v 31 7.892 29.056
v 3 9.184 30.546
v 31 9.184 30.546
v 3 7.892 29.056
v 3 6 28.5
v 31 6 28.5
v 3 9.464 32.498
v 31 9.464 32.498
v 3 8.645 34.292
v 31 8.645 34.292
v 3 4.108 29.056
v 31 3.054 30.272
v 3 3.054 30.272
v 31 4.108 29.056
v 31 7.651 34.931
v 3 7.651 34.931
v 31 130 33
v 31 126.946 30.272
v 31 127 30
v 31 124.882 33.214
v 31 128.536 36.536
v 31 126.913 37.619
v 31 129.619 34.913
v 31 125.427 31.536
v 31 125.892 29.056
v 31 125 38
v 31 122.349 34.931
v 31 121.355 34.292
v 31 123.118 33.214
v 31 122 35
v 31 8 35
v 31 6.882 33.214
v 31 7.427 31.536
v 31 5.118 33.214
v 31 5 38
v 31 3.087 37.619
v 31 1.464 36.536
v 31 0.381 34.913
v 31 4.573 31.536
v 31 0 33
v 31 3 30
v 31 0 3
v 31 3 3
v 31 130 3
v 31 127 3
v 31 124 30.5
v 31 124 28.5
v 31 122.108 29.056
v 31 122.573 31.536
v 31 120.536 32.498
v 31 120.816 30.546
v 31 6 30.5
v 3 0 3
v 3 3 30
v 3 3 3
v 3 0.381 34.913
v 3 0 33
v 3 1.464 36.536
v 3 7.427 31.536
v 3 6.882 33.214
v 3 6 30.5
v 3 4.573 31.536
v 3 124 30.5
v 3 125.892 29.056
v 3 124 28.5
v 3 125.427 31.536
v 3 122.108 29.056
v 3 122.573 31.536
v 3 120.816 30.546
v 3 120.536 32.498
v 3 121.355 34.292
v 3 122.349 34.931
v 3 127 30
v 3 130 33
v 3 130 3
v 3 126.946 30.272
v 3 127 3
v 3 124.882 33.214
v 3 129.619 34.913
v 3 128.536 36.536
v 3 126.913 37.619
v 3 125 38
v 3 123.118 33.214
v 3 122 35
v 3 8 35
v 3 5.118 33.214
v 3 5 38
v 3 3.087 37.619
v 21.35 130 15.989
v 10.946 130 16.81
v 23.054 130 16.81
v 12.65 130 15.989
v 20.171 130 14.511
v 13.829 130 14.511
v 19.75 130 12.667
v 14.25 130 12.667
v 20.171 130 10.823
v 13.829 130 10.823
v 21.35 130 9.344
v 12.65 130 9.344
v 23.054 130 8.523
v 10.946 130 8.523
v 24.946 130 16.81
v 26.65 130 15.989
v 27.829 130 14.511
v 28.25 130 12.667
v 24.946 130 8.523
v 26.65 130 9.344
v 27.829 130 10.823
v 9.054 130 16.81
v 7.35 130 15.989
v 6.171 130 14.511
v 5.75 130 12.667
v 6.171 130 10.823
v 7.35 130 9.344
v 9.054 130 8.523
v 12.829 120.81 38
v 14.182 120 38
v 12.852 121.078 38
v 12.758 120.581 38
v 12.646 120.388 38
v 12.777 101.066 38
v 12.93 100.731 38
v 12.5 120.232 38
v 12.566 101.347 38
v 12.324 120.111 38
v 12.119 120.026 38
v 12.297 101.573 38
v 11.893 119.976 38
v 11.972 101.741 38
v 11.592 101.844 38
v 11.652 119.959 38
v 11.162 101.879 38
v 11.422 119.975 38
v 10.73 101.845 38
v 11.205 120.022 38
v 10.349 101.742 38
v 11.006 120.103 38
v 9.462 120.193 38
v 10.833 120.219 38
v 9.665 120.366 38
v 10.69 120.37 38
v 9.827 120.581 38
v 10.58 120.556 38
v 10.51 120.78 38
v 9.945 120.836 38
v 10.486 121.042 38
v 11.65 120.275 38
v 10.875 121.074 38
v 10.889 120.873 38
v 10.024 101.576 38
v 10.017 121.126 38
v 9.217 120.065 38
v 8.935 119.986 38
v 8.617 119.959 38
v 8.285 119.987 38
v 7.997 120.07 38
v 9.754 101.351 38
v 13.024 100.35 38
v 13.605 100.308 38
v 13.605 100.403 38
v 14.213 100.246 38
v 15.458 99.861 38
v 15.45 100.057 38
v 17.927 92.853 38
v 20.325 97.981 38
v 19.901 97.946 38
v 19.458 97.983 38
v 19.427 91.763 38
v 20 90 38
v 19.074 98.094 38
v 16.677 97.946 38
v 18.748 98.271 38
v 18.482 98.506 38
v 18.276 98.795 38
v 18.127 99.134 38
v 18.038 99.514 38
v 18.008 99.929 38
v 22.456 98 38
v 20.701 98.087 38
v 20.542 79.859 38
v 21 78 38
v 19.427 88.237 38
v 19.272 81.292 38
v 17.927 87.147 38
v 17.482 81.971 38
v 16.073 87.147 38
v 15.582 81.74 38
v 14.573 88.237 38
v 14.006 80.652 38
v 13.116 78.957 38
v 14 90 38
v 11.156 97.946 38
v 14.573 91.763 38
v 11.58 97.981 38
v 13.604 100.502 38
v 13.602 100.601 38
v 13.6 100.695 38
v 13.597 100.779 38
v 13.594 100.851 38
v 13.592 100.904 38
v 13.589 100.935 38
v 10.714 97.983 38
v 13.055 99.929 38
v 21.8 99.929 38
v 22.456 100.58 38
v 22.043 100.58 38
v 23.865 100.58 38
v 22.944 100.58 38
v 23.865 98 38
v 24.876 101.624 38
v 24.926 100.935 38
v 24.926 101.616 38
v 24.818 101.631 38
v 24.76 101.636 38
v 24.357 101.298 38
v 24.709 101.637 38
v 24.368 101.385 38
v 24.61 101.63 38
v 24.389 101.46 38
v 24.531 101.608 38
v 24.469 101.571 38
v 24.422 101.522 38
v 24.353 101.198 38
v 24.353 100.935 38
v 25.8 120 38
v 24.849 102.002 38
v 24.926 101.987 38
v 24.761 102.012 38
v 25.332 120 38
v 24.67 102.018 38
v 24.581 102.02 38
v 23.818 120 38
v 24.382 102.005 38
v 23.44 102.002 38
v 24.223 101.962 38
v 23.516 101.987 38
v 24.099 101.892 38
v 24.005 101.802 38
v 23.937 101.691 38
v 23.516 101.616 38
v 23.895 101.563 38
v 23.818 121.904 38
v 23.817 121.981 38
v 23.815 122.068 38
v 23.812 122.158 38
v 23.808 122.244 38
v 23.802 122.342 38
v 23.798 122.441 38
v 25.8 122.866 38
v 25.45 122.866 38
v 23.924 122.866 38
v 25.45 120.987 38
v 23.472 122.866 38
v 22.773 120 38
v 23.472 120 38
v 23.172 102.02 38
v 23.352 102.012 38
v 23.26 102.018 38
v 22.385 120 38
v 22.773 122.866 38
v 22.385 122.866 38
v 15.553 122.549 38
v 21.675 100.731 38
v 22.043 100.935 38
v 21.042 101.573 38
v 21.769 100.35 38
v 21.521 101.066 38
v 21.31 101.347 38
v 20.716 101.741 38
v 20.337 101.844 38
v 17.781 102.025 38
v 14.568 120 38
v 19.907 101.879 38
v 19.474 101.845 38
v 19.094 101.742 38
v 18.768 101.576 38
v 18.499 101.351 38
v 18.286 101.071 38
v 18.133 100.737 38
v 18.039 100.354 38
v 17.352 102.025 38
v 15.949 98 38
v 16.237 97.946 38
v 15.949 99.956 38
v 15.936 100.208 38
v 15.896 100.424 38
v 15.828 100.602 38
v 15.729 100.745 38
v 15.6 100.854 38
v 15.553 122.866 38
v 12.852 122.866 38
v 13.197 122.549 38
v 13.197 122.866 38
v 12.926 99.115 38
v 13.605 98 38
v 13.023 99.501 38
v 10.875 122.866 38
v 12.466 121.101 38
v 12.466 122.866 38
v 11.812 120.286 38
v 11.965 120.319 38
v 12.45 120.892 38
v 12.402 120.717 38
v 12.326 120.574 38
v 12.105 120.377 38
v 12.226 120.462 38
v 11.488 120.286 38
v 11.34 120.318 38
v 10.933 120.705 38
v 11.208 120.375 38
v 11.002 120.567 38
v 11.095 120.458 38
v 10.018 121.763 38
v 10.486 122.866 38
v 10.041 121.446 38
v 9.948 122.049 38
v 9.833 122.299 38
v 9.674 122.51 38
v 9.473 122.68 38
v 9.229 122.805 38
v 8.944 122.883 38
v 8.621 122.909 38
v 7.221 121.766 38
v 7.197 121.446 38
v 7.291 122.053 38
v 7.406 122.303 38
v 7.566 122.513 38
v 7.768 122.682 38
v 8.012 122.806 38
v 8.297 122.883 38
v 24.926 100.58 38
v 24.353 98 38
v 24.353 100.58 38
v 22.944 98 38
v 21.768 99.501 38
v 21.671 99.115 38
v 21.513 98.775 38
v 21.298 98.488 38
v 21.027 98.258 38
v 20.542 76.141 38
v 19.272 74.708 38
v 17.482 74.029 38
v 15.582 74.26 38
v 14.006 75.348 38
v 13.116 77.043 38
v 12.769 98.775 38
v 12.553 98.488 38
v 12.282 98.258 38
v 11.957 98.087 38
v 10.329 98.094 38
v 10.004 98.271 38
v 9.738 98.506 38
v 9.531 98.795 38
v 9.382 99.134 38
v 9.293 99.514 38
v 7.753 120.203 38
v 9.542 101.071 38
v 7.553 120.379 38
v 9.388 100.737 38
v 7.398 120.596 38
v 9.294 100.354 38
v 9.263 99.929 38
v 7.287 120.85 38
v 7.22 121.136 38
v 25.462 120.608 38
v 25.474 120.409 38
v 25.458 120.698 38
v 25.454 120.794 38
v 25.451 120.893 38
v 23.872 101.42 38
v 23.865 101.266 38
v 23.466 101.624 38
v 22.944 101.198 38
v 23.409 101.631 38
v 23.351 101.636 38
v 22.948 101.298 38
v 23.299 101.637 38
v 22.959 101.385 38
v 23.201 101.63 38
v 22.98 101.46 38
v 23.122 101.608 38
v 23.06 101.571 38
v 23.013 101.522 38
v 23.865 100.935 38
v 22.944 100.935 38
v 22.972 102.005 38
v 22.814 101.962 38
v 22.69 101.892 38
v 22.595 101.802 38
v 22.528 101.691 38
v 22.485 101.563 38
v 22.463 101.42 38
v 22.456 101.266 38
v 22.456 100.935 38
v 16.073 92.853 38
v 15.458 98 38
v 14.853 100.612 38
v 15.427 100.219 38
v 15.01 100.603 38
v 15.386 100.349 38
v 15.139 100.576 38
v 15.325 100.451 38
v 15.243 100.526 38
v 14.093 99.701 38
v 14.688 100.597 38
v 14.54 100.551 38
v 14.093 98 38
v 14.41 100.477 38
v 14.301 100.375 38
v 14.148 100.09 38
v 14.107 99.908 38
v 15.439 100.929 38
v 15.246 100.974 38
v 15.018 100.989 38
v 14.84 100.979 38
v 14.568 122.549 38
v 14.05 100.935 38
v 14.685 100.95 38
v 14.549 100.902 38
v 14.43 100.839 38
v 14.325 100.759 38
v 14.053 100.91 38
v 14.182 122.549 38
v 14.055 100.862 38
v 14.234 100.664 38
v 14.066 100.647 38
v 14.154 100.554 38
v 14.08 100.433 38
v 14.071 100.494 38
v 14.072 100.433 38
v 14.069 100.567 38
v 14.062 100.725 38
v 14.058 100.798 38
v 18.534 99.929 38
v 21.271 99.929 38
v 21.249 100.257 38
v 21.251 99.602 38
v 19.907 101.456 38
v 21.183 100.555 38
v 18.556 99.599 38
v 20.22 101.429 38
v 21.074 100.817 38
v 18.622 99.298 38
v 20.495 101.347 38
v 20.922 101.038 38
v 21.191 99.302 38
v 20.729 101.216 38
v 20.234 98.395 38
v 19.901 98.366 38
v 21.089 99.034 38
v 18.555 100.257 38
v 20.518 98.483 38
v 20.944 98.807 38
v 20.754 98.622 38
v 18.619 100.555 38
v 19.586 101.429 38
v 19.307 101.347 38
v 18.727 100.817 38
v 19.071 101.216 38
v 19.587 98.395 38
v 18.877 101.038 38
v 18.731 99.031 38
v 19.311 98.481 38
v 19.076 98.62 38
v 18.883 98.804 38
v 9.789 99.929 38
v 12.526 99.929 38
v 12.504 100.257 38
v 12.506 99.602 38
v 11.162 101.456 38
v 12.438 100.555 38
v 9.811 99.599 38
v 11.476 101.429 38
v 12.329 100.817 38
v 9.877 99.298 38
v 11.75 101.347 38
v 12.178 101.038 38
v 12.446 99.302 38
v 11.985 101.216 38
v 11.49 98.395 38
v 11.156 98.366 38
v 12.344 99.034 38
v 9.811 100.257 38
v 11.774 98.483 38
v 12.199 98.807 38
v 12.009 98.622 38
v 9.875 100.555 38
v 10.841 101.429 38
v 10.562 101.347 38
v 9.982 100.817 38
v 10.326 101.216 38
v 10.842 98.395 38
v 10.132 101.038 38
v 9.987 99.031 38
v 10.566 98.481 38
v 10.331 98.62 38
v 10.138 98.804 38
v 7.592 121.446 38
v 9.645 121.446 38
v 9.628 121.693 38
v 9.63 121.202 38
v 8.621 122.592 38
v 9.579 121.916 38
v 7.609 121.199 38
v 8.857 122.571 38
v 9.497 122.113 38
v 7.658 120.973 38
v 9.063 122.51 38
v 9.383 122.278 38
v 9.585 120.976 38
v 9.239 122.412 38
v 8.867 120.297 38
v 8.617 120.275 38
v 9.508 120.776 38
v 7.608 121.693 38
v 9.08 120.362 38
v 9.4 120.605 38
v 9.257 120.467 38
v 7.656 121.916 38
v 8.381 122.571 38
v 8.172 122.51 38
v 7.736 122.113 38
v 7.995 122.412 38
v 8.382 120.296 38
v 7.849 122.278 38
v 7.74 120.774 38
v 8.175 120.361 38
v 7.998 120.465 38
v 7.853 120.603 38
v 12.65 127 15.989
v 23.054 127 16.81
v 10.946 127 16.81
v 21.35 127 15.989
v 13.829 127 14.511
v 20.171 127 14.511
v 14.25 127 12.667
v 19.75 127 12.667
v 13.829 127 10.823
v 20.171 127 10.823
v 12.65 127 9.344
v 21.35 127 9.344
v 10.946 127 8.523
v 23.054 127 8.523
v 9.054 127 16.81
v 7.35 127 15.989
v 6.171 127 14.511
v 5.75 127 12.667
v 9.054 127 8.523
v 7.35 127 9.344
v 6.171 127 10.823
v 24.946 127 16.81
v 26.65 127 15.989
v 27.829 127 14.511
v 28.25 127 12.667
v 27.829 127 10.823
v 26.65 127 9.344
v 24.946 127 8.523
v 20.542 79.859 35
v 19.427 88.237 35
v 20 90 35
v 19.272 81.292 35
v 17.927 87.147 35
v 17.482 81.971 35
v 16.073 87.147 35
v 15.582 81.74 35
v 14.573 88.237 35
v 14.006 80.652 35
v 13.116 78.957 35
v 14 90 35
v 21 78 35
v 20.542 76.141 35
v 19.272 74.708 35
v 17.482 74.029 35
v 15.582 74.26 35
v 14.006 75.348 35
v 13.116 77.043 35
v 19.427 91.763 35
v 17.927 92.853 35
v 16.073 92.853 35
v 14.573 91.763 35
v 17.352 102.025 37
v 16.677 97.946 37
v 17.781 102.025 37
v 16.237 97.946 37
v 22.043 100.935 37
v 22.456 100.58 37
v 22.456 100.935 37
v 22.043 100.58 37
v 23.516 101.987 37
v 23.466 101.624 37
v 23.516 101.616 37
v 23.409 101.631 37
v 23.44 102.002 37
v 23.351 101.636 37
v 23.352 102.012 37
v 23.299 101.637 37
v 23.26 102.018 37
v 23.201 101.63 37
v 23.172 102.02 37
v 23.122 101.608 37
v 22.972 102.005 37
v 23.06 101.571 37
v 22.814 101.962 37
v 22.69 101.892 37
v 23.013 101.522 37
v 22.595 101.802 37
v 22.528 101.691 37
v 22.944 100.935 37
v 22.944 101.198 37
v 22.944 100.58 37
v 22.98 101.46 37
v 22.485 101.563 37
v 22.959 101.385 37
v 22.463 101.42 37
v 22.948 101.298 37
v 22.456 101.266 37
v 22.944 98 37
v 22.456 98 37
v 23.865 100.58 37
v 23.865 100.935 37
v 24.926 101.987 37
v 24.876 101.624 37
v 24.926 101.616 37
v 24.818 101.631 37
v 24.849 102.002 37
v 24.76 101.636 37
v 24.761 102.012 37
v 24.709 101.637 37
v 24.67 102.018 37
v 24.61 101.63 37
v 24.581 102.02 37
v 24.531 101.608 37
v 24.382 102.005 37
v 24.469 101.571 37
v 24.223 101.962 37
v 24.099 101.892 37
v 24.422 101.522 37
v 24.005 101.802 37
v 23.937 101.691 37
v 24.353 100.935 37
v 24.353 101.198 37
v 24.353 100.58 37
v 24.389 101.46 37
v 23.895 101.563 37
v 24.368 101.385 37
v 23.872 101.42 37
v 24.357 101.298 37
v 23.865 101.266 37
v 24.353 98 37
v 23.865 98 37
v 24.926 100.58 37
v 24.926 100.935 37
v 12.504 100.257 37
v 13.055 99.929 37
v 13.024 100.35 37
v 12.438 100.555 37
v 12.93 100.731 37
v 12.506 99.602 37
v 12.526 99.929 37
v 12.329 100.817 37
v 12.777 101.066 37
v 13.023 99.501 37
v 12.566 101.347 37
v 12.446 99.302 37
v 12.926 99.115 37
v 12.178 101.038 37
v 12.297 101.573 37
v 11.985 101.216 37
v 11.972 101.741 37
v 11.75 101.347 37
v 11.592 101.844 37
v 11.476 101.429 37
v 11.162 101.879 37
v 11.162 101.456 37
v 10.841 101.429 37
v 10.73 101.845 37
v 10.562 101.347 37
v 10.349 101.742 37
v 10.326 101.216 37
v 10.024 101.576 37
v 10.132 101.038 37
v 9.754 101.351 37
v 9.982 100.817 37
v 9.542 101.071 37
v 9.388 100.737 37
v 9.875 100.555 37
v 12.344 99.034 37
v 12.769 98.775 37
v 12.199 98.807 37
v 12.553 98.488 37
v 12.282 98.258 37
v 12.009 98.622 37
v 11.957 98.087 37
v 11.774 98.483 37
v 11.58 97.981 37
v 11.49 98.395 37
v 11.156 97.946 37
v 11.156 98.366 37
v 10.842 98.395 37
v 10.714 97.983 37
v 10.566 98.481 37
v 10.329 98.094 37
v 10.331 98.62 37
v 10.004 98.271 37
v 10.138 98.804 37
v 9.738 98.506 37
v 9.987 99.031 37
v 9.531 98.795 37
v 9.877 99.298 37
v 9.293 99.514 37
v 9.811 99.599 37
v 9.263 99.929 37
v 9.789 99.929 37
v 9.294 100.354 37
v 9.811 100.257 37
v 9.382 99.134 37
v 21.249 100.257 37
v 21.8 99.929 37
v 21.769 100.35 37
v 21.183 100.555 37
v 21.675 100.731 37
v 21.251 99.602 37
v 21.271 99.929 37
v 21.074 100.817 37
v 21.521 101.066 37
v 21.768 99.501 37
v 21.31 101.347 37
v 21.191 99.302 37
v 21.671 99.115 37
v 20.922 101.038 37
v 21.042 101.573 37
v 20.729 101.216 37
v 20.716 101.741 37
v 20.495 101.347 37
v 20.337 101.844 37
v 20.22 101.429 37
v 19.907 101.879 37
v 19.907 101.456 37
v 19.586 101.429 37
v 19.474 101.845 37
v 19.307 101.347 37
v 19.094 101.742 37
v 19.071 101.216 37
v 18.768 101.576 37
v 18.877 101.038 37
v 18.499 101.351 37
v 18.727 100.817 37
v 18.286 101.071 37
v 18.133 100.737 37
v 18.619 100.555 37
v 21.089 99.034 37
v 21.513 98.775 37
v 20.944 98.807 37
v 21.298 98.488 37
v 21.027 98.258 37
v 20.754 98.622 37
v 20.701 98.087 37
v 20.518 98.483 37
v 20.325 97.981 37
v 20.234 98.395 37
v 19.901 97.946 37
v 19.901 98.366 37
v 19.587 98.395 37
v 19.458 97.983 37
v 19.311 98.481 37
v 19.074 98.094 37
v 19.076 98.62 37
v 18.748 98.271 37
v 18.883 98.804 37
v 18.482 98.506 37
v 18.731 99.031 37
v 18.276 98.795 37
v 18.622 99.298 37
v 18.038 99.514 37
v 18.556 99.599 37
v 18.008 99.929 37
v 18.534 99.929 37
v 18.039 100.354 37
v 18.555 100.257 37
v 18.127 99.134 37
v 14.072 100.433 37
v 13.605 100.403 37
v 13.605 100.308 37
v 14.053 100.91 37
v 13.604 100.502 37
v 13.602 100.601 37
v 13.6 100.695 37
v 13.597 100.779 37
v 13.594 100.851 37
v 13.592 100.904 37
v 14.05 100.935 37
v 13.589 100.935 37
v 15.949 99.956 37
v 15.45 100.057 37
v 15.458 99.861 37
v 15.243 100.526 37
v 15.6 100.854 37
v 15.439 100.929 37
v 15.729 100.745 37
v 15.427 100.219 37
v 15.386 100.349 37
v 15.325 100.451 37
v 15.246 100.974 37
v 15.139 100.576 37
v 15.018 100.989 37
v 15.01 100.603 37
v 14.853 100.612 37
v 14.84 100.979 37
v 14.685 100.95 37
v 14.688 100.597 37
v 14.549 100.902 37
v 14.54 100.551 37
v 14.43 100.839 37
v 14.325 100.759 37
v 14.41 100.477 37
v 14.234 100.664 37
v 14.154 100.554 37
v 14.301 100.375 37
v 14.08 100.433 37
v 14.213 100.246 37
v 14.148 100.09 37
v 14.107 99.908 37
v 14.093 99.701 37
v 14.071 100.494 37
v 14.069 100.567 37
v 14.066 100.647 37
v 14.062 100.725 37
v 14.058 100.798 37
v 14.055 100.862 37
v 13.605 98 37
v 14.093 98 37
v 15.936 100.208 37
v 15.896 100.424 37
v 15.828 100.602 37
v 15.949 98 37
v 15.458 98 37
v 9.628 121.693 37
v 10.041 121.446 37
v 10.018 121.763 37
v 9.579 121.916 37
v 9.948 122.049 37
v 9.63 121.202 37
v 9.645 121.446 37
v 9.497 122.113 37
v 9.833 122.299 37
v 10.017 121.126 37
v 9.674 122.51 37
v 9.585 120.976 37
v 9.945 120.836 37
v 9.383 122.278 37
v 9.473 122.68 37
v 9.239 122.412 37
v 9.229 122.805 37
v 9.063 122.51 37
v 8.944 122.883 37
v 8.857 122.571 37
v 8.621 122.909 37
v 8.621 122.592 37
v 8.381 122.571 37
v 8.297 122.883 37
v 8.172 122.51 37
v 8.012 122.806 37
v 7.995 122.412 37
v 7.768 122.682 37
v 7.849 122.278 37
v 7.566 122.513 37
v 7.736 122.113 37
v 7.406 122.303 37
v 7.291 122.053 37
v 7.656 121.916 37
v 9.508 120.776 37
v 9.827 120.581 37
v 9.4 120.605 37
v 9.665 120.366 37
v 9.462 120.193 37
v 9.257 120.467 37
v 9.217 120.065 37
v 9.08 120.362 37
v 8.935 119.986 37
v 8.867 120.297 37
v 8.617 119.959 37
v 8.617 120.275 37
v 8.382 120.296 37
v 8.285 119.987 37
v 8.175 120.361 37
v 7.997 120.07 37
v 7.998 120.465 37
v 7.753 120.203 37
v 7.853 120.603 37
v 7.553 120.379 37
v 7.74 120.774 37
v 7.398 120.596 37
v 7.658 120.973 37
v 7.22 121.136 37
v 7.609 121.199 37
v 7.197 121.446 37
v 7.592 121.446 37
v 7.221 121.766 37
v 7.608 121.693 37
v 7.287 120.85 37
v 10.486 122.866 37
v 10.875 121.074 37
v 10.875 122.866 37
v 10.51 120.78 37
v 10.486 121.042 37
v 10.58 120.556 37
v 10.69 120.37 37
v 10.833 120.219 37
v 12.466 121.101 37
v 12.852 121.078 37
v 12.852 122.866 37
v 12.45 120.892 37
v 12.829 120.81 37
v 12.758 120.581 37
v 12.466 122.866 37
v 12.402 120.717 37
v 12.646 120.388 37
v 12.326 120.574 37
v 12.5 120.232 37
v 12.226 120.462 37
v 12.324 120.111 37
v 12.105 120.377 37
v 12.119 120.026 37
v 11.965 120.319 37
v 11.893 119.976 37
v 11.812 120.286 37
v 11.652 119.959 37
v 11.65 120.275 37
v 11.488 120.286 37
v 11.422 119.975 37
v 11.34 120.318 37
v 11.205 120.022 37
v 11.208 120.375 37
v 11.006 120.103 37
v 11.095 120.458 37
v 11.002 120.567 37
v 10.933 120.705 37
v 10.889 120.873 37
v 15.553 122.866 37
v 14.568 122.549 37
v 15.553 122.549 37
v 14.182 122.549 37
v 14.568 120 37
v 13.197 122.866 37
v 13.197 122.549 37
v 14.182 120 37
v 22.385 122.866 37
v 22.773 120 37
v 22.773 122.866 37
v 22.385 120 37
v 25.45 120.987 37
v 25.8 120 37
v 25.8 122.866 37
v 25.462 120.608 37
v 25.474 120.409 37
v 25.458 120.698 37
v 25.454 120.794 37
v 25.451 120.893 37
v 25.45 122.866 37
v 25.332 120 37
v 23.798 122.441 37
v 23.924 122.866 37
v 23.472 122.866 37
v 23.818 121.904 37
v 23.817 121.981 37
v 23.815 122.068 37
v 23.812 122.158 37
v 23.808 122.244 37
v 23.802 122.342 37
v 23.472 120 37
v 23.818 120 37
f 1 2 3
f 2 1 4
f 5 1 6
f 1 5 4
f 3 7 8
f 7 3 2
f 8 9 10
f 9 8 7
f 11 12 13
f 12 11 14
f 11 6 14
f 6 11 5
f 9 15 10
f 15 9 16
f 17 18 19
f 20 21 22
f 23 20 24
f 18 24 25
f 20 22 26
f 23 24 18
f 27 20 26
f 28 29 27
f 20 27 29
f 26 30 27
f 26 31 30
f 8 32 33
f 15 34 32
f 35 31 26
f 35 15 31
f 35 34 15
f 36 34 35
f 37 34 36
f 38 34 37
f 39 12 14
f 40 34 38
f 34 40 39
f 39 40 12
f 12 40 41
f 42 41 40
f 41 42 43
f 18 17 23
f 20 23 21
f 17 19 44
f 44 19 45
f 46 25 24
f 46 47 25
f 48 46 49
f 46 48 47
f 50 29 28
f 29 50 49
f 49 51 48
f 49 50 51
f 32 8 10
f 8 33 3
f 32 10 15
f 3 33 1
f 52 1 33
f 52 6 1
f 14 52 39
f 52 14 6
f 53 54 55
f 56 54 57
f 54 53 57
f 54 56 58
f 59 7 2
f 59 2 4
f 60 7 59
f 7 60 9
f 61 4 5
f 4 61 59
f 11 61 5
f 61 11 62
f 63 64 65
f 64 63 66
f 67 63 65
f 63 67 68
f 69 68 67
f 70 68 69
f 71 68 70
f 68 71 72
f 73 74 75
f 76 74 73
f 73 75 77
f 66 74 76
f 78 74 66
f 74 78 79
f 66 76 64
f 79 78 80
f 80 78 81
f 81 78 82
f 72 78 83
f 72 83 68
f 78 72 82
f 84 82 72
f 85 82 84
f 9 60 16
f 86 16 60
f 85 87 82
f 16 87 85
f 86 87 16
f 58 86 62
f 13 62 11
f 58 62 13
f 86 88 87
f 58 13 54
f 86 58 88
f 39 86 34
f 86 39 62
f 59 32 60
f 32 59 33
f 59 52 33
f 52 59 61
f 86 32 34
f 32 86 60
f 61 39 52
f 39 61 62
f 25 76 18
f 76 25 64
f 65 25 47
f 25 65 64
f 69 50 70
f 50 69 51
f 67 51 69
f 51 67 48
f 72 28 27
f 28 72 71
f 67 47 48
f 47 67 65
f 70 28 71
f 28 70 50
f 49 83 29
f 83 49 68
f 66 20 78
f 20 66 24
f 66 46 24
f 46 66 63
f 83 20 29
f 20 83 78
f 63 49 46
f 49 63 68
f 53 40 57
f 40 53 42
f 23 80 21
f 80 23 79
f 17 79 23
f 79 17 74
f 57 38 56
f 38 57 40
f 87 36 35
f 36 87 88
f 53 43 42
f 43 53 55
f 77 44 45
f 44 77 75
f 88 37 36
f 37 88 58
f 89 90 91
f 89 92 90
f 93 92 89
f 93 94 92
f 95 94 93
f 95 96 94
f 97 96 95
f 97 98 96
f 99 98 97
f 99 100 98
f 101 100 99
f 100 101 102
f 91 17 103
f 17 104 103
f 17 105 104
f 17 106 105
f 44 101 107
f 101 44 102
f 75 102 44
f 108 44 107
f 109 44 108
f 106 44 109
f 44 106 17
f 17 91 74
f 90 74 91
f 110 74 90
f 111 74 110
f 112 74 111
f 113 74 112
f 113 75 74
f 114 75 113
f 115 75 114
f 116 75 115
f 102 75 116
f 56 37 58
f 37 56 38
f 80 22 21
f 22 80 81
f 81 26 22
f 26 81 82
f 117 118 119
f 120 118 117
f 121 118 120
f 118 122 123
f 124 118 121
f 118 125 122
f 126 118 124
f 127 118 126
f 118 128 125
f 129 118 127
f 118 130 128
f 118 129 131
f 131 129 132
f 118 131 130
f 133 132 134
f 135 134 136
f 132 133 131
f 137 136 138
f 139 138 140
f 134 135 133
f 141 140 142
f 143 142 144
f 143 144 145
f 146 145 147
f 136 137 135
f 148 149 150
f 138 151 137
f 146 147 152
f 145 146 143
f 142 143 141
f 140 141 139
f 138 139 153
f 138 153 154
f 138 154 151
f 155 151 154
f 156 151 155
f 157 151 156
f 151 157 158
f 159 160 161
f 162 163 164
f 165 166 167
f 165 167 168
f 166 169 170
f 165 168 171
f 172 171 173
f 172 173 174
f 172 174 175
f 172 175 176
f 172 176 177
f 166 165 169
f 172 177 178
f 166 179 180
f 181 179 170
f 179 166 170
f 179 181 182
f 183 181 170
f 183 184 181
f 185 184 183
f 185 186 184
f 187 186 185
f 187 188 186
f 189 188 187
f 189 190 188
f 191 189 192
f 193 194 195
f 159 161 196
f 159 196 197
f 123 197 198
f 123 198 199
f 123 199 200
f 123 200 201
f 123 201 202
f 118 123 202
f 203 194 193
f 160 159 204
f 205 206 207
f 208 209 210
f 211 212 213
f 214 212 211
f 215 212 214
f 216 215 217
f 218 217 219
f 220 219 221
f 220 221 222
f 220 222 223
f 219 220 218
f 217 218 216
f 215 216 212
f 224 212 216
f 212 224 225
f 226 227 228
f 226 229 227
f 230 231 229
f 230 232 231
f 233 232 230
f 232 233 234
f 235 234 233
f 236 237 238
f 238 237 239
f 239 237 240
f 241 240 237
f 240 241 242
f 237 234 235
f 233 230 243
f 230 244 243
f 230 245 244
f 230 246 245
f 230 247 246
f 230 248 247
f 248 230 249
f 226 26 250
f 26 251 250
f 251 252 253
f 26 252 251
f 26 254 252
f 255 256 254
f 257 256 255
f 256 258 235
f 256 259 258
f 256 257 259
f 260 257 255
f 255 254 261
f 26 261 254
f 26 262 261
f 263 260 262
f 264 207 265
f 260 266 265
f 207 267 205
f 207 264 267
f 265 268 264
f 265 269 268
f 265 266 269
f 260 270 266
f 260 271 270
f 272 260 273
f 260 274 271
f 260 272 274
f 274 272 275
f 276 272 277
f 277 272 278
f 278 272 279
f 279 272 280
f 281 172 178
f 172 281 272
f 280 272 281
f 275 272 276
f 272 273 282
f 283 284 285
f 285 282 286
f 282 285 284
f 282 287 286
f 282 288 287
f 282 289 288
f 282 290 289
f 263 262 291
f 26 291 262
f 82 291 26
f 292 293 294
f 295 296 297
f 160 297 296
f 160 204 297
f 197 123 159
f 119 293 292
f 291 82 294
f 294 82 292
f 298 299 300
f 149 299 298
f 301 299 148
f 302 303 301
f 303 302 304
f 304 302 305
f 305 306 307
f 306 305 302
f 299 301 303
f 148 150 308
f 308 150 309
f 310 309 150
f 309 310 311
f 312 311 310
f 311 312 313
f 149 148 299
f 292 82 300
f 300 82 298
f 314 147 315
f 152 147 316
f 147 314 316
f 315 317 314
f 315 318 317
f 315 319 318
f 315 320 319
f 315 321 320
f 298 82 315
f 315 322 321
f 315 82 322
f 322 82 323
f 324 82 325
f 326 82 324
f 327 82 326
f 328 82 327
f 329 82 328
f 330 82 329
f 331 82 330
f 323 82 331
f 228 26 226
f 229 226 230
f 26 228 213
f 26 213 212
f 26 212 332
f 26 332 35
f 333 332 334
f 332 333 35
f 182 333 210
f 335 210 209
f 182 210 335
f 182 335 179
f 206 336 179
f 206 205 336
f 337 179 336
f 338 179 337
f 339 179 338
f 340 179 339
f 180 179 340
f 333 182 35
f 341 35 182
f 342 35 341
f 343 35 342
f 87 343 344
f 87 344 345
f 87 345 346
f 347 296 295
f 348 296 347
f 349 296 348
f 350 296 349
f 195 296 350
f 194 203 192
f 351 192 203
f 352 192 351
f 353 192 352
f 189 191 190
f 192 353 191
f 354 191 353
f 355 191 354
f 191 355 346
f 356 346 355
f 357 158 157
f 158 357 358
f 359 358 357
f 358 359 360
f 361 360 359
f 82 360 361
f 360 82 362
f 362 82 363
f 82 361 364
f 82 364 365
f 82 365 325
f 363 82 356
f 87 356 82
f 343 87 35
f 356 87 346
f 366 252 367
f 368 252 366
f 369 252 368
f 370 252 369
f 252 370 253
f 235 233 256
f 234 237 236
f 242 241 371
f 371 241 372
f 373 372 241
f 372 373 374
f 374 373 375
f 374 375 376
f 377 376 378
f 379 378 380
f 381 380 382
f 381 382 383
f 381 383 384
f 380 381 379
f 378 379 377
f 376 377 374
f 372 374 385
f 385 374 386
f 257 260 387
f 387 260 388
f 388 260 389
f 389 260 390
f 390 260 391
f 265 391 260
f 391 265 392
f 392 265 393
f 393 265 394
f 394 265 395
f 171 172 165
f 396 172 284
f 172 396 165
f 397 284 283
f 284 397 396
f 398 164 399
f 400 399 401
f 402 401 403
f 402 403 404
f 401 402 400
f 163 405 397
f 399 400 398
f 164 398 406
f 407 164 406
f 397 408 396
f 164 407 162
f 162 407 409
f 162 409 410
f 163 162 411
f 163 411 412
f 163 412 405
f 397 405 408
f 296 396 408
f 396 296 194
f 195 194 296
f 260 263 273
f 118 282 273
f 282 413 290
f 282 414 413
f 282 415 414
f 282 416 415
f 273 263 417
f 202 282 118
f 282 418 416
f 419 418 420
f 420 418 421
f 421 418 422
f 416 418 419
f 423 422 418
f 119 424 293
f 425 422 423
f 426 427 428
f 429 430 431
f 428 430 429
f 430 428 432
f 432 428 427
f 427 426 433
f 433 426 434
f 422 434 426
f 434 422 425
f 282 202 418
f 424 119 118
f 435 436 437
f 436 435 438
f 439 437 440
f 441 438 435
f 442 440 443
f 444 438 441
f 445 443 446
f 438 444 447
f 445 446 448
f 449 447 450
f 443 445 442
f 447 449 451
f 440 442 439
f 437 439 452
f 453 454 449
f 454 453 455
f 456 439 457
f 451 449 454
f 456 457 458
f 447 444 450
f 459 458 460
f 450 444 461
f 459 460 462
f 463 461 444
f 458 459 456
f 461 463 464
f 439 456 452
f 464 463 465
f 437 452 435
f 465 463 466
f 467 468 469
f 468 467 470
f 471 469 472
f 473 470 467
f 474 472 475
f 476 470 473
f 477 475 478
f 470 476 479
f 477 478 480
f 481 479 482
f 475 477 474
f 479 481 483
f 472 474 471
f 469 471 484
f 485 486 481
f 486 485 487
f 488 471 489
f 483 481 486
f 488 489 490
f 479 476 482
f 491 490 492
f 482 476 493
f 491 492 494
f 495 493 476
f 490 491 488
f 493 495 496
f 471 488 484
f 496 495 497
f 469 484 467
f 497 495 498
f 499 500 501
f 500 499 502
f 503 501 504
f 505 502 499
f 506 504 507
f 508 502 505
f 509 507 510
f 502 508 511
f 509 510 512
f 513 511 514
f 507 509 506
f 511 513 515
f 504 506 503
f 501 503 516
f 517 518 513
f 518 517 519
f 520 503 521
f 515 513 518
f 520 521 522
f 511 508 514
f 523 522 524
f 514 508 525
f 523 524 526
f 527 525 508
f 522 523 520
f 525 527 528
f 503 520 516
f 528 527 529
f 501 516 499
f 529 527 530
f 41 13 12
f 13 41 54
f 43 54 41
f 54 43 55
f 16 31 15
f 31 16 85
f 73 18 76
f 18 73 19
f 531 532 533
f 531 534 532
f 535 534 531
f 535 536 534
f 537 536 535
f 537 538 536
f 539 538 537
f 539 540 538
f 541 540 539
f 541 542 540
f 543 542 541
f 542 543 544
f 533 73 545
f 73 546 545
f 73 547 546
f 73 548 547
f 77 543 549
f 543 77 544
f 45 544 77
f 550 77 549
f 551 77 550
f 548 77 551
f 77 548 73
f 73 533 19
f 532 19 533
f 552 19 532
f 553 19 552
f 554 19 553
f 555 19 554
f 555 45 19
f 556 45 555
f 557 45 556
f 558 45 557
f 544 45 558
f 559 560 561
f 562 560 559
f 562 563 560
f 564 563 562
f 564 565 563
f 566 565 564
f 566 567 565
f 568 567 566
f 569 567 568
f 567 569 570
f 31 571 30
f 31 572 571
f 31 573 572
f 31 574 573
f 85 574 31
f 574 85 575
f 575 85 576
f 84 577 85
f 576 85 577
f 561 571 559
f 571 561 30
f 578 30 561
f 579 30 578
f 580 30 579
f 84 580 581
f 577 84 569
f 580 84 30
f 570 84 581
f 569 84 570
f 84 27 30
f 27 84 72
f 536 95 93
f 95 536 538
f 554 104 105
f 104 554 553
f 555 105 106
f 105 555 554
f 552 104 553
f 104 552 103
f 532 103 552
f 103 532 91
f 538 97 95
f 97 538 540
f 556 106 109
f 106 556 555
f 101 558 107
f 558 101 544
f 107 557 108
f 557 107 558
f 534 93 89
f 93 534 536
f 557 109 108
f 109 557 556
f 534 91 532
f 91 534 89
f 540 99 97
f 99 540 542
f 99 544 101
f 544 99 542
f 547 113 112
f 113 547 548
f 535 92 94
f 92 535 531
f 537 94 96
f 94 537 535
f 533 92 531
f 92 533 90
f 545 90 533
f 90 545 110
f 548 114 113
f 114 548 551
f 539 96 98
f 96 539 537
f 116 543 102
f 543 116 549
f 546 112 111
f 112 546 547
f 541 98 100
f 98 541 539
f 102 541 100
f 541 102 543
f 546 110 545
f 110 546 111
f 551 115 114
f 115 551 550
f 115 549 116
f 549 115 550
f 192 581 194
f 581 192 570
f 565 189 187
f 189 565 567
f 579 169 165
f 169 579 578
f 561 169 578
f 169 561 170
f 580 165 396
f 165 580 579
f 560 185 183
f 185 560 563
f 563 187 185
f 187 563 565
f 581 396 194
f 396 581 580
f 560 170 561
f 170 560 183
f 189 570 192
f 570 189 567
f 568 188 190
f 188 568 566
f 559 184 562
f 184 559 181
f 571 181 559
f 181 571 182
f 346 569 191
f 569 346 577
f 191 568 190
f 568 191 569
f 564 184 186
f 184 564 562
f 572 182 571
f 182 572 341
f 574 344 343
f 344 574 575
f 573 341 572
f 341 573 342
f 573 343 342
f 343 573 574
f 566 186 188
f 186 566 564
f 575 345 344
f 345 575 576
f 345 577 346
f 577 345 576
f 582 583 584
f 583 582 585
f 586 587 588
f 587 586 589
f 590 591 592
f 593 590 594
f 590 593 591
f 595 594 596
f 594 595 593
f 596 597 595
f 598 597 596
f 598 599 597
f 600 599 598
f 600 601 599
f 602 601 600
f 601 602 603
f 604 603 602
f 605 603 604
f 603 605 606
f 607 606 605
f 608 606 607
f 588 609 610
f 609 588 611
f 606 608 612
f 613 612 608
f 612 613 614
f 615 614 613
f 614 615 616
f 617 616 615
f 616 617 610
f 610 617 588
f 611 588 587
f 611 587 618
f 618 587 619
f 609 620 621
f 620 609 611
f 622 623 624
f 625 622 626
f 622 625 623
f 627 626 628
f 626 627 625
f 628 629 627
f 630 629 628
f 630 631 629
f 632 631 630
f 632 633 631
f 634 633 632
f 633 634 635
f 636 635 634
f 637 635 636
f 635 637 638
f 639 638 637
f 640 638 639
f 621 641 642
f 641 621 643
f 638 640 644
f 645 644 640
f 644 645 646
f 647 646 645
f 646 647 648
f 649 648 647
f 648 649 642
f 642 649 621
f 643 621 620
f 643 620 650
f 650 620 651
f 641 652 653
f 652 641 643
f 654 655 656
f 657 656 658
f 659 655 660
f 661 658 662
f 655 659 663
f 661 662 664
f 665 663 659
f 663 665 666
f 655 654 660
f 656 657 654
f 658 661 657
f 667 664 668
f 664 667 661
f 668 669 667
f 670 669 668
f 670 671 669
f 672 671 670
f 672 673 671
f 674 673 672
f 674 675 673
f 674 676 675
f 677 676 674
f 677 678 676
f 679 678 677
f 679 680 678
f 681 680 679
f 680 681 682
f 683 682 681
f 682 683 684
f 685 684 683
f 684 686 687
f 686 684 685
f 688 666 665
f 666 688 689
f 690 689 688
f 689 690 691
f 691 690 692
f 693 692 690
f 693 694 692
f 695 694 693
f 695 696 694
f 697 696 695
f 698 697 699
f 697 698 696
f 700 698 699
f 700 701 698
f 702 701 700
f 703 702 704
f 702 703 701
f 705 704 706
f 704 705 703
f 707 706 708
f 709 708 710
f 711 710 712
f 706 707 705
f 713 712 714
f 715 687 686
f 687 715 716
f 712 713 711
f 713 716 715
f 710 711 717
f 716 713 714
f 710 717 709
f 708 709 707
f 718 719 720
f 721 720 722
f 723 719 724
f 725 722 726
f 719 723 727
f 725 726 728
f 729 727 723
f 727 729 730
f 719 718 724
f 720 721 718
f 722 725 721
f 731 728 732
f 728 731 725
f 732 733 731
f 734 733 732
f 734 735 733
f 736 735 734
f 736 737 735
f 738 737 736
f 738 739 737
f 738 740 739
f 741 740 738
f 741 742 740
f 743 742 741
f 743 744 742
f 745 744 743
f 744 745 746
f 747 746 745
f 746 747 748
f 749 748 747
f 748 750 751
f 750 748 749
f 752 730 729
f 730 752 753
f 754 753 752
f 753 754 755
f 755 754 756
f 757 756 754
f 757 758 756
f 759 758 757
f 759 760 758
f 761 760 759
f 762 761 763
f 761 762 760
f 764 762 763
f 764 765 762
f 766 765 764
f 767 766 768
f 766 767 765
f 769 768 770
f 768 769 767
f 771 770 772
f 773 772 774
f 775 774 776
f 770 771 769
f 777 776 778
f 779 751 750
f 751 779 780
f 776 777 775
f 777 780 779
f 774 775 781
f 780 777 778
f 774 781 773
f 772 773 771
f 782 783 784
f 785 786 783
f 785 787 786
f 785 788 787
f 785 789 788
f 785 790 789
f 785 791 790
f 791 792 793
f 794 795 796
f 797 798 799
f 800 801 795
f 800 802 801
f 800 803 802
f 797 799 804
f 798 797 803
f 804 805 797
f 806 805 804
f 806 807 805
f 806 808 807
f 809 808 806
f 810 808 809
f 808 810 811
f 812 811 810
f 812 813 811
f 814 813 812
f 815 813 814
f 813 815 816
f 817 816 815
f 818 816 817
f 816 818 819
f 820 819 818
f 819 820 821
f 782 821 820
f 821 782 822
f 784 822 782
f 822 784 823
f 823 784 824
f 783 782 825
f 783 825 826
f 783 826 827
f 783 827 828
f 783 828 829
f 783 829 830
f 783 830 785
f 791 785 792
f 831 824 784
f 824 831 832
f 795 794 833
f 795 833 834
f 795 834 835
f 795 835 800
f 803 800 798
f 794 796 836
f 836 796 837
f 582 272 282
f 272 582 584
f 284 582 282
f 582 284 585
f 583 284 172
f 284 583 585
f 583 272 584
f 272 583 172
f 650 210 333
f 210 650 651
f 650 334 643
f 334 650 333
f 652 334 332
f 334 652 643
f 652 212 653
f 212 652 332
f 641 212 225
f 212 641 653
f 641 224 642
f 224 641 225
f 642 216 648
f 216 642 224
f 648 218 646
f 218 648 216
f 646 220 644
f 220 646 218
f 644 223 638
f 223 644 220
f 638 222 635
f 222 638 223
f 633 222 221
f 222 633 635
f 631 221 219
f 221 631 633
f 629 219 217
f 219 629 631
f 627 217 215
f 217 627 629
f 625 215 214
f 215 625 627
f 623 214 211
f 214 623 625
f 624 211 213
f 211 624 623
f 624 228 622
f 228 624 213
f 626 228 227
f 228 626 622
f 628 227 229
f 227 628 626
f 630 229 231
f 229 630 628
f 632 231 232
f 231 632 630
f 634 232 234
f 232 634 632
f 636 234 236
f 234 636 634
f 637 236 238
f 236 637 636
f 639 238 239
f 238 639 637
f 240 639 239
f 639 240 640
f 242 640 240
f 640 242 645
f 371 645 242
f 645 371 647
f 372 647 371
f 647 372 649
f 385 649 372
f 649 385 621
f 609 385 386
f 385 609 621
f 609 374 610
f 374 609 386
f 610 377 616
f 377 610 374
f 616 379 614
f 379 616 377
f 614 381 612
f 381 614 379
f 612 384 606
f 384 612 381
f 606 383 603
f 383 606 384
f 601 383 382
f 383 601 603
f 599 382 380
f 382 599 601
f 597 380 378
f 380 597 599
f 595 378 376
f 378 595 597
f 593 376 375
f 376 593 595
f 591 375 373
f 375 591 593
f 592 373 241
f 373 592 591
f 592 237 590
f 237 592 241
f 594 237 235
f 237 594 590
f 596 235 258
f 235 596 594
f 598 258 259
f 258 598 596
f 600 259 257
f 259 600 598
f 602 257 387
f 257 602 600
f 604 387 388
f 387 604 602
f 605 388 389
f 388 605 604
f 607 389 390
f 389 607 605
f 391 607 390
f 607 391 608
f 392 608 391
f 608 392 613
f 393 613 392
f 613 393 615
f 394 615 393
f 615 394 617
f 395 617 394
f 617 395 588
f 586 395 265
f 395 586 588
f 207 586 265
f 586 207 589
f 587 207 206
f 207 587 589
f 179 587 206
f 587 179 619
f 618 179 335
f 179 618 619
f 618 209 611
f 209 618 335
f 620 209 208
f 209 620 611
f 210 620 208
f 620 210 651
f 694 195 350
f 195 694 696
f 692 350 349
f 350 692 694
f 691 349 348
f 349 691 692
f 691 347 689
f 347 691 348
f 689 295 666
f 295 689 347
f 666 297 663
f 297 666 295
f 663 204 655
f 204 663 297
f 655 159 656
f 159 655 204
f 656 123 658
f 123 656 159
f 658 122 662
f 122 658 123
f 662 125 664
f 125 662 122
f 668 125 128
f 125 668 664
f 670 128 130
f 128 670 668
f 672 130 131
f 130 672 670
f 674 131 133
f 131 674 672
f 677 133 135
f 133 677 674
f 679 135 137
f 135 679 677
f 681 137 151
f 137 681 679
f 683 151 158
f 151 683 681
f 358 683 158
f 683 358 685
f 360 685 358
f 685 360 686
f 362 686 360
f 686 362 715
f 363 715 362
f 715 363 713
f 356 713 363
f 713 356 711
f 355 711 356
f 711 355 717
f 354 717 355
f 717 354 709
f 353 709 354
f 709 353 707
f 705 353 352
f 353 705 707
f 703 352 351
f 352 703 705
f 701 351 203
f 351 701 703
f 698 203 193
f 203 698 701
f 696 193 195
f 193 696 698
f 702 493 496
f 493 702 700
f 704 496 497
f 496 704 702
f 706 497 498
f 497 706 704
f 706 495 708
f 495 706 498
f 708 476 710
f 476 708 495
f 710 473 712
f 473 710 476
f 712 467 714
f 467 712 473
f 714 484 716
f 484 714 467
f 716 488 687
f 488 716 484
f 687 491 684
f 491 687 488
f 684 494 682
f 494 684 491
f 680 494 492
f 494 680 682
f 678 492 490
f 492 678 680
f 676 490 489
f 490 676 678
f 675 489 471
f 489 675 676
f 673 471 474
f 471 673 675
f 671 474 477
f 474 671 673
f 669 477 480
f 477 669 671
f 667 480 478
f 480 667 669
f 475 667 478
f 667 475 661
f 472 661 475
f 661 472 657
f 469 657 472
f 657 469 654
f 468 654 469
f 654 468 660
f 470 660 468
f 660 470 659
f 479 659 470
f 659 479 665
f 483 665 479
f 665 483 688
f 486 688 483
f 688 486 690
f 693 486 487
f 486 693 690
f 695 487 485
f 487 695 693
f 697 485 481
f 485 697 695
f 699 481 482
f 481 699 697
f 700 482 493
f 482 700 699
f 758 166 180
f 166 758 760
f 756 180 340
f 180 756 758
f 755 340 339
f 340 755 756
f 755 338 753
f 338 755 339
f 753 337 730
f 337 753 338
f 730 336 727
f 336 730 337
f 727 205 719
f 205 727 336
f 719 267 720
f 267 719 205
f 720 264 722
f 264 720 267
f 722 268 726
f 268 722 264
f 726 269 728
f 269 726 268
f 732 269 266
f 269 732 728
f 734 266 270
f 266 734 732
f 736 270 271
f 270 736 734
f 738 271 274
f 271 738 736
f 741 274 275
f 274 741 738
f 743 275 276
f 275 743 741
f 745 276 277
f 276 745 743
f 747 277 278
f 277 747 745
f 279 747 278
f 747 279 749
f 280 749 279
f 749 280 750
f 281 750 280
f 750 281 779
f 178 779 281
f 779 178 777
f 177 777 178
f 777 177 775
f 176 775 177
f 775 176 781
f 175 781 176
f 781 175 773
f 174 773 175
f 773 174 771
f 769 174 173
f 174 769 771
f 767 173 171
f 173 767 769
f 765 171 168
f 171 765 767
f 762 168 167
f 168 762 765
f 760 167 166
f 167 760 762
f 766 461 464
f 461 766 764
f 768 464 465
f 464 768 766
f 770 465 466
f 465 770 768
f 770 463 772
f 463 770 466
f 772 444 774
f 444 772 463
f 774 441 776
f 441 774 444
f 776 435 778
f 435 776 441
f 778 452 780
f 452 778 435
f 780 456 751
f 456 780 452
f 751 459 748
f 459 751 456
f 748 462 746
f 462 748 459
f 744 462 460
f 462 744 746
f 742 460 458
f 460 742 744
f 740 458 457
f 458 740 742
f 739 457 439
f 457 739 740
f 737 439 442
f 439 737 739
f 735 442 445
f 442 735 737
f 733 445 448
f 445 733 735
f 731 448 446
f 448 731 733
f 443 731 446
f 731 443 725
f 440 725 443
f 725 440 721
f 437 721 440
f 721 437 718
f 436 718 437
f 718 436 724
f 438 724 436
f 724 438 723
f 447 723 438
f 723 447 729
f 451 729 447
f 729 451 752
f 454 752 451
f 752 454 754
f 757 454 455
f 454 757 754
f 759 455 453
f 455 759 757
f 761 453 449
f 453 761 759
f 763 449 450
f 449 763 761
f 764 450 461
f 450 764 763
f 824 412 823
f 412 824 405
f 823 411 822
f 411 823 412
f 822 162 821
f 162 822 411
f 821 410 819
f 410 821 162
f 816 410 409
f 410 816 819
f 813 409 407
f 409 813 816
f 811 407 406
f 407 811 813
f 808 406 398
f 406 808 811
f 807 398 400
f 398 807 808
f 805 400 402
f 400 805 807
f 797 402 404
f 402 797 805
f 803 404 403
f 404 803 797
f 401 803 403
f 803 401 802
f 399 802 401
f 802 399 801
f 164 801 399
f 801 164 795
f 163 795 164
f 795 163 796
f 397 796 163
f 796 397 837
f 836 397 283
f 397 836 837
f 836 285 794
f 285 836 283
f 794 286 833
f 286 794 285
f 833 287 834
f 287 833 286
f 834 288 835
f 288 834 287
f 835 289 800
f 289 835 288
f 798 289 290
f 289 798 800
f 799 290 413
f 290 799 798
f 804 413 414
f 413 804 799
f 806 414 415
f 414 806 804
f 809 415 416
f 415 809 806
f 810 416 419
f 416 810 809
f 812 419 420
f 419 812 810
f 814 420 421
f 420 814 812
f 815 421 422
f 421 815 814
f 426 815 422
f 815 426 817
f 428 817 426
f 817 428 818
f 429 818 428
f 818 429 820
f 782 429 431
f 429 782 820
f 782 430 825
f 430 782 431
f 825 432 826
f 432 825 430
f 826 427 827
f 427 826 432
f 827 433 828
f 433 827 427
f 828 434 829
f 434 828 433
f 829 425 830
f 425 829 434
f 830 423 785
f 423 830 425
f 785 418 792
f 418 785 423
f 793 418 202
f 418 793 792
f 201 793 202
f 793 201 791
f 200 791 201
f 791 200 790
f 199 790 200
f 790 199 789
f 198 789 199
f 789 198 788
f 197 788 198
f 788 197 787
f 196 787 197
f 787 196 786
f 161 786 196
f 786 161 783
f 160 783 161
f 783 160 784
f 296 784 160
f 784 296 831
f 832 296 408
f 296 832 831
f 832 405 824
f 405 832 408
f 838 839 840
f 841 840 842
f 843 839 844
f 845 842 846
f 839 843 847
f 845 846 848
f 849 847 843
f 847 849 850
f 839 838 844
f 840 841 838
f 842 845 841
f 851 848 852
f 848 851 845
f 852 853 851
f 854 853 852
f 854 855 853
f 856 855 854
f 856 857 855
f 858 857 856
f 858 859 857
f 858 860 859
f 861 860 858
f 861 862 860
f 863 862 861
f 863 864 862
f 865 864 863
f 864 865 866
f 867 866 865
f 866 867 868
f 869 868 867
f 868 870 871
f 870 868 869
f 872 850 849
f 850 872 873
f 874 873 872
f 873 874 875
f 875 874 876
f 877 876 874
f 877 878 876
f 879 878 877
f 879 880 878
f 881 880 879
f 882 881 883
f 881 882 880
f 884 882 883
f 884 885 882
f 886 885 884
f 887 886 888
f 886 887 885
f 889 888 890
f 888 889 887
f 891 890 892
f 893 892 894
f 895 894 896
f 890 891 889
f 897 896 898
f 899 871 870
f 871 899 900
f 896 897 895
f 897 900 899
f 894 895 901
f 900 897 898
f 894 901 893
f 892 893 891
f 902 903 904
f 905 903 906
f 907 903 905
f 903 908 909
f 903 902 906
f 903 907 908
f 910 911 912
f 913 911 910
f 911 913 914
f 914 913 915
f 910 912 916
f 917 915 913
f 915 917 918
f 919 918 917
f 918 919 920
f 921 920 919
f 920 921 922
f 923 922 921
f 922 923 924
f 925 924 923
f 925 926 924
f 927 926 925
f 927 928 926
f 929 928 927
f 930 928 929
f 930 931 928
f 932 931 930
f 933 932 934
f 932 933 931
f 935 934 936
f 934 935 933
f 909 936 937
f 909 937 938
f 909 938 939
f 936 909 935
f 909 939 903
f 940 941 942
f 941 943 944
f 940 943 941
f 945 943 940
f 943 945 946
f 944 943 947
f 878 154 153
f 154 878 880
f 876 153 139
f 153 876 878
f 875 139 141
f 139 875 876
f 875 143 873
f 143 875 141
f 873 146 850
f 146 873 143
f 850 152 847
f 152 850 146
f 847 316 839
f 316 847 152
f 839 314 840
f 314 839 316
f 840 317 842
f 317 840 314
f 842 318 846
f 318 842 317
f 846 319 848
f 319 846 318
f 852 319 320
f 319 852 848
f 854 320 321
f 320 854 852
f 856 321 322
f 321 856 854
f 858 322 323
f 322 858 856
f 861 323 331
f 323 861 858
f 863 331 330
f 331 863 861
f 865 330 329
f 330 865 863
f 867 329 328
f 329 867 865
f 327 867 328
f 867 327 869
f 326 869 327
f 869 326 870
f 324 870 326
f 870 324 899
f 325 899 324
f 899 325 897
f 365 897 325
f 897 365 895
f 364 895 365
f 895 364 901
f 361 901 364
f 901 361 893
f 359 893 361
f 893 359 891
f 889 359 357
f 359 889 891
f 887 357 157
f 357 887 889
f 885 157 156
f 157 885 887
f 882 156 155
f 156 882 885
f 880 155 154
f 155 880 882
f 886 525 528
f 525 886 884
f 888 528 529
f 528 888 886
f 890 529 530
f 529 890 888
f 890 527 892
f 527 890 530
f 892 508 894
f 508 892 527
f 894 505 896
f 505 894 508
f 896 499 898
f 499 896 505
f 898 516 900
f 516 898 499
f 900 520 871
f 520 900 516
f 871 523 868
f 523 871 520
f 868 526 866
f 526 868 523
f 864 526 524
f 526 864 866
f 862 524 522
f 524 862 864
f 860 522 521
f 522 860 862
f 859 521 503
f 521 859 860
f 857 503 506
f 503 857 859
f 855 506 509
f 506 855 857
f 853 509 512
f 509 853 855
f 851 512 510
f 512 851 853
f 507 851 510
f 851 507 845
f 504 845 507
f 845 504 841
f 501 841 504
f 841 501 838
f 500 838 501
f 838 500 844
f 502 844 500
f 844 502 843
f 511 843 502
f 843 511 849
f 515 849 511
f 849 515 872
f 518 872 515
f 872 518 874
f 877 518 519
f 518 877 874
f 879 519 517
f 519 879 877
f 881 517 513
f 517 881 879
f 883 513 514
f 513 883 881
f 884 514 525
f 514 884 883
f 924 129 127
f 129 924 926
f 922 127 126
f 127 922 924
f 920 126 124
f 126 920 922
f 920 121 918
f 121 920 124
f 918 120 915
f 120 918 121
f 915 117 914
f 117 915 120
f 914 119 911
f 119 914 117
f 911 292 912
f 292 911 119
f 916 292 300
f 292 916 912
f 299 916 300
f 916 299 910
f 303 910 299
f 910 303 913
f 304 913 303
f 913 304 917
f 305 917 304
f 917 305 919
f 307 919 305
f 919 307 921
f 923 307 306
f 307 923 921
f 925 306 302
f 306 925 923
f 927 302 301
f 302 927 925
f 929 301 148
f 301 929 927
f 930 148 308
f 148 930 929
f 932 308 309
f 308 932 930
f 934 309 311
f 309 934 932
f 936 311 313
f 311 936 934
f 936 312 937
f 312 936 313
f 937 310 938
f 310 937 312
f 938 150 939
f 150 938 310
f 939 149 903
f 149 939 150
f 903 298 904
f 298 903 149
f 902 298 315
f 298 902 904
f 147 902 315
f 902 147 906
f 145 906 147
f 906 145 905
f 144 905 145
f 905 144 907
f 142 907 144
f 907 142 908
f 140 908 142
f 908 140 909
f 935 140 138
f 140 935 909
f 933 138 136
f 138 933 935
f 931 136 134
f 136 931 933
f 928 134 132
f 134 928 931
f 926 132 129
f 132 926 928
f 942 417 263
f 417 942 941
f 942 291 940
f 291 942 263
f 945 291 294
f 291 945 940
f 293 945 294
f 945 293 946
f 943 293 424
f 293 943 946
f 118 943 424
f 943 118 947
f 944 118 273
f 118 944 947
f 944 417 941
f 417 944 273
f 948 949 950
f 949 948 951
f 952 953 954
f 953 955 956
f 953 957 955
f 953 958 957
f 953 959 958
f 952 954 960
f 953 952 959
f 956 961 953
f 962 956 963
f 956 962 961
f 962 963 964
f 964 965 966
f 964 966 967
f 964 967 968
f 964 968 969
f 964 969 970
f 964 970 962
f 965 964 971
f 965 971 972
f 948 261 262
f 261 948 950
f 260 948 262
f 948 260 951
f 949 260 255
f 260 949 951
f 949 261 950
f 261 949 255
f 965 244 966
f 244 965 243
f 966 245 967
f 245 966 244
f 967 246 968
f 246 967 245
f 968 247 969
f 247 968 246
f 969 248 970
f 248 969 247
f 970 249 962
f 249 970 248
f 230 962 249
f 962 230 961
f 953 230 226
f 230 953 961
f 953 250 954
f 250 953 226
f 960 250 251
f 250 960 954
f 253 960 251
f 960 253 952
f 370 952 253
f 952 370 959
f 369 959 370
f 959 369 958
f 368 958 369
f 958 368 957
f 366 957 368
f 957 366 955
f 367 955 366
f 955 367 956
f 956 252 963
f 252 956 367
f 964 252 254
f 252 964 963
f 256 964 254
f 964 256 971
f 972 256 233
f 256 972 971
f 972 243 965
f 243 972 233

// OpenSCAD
//tc electronic box: 74x130x38, rozstaw śrub 100

box_wall=3;
box_width=40-box_wall*2;
box_depth=130;
box_height=38;
box_radius=5;

module power_socket() {
    cylinder(h=box_wall, d=8.5);
}

module jack_socket() {
    cylinder(h=box_wall*2, d=9.5);
}

module switch_socket() {
    cylinder(h=box_wall*2, d=6);
}

module led_socket() {
    cylinder(h=box_wall*2, d=8);
}

module pcb_mount(pcb_width, pcb_depth, pcb_height, wall=2) {
    difference() {
        cube([wall*4,wall+pcb_height,pcb_depth]);
        translate([wall,0,0]) {
            cube([wall*3,pcb_height,pcb_depth]);
        }
    }
    
    translate([pcb_width,0,0]) {
        difference() {
            cube([wall*4,wall+pcb_height,pcb_depth]);
            cube([wall*3,pcb_height,pcb_depth]);
            }
        }
    
}

module rounded_square(width, height, radius) {
    hull() {
        translate([radius, radius, 0]) {
            circle(r=radius);
        }
        translate([width-radius, radius, 0]) {
            circle(r=radius);
        }
        translate([radius, height-radius, 0]) {
            circle(r=radius);
        }
        translate([width-radius, height-radius, 0]) {
            circle(r=radius);
        }
    }
}

module bottom_side(width, height, radius, wall, with_holes=false) {
    rotate([90,0,90]) {
        difference() {
            linear_extrude(wall) {
                hull() {
                    translate([radius, height - radius]) {
                        circle(radius);
                    }
                    translate([width-radius, height-radius]) {
                        circle(radius);
                    }
                    translate([width-radius, 0]) {
                        square(radius, radius);
                    }
                    square(radius, radius);
                }
            }
            
            if (with_holes) {
                translate([6,box_height-6,0]) {
                    cylinder(h=box_wall, d=3);
                }
                translate([box_depth-6,box_height-6,0]) {
                    cylinder(h=box_wall, d=3);
                }
            }
        }
    }
}



module bottom_part() {    
    bottom_side(box_depth,box_height,box_radius,box_wall, with_holes=true);

    translate([box_width-box_wall,0,0]) {    
        bottom_side(box_depth,box_height,box_radius,box_wall, with_holes=true);
    }

    linear_extrude(box_wall) {
        difference() {
            square([box_width, box_depth]);
            translate([box_width/2, box_depth/2-50,0]) {
                circle(d=4);
            }
            translate([box_width/2, box_depth/2+50,0]) {
                circle(d=4);
            }
        }
    }
}
        
module top_mount() {
    difference() {
        cylinder(h=box_width-box_wall*2, d=7);
        cylinder(h=box_width-box_wall*2, d=3);
    }
}

module top_part() {
    translate([box_wall, 6, box_height-6]) {
        rotate([0,90,0]) {
            difference() {
                top_mount();
            }
        }
    }
    
    translate([box_wall, box_depth-6, box_height-6]) {
        rotate([0,90,0]) {
            difference() {
                top_mount();
            }
        }
    }
    
    difference() {
        translate([box_wall,0,box_wall]) {
            bottom_side(box_depth, box_height-box_wall, box_radius, box_width-box_wall*2);
        }
        
        translate([box_wall,box_wall,box_wall]) {
            bottom_side(box_depth-box_wall*2, box_height-box_wall*2, box_radius, box_width-box_wall*2);
        }
        
        /* bottom sockets
        translate([box_width/2,box_wall,box_height/3]) {
            rotate([90,0,0]) {
                power_socket();
            }
        }
        */
        
        //top sockets
    }
}

module top_part_dc_rf_relay() {
    difference() {
        top_part();

        rotate([90,0,0]) {
            translate([box_width-10, box_height/3, -box_depth]) {
                power_socket();
            }
            
            translate([10, box_height/3, -box_depth]) {
                power_socket();
            }
        }
        
        translate([box_width/2,box_depth-40, box_height-box_wall*2]) {
            switch_socket();
        }
        
        translate([box_width/2,box_depth-52, box_height-box_wall*2]) {
            led_socket();
        }
        
        translate([9,box_depth-32,box_height-1]) {
            linear_extrude(1) {
                text("On/Off", size=4);
            }
        } 
        
        translate([7,box_depth-10,box_height-1]) {
            linear_extrude(1) {
                text("OUT", size=3);
            }
        }
        
        translate([box_width-12,box_depth-10,box_height-1]) {
            linear_extrude(1) {
                text("IN", size=3);
            }
        }
    }
}

top_part_dc_rf_relay();


module bottom_pard_dc_rf_relay() {
    bottom_part();

    translate([box_width-box_wall,25,0]) {
        rotate([0,0,90]) {
            pcb_mount(50,30,3);
        }
    }
}
